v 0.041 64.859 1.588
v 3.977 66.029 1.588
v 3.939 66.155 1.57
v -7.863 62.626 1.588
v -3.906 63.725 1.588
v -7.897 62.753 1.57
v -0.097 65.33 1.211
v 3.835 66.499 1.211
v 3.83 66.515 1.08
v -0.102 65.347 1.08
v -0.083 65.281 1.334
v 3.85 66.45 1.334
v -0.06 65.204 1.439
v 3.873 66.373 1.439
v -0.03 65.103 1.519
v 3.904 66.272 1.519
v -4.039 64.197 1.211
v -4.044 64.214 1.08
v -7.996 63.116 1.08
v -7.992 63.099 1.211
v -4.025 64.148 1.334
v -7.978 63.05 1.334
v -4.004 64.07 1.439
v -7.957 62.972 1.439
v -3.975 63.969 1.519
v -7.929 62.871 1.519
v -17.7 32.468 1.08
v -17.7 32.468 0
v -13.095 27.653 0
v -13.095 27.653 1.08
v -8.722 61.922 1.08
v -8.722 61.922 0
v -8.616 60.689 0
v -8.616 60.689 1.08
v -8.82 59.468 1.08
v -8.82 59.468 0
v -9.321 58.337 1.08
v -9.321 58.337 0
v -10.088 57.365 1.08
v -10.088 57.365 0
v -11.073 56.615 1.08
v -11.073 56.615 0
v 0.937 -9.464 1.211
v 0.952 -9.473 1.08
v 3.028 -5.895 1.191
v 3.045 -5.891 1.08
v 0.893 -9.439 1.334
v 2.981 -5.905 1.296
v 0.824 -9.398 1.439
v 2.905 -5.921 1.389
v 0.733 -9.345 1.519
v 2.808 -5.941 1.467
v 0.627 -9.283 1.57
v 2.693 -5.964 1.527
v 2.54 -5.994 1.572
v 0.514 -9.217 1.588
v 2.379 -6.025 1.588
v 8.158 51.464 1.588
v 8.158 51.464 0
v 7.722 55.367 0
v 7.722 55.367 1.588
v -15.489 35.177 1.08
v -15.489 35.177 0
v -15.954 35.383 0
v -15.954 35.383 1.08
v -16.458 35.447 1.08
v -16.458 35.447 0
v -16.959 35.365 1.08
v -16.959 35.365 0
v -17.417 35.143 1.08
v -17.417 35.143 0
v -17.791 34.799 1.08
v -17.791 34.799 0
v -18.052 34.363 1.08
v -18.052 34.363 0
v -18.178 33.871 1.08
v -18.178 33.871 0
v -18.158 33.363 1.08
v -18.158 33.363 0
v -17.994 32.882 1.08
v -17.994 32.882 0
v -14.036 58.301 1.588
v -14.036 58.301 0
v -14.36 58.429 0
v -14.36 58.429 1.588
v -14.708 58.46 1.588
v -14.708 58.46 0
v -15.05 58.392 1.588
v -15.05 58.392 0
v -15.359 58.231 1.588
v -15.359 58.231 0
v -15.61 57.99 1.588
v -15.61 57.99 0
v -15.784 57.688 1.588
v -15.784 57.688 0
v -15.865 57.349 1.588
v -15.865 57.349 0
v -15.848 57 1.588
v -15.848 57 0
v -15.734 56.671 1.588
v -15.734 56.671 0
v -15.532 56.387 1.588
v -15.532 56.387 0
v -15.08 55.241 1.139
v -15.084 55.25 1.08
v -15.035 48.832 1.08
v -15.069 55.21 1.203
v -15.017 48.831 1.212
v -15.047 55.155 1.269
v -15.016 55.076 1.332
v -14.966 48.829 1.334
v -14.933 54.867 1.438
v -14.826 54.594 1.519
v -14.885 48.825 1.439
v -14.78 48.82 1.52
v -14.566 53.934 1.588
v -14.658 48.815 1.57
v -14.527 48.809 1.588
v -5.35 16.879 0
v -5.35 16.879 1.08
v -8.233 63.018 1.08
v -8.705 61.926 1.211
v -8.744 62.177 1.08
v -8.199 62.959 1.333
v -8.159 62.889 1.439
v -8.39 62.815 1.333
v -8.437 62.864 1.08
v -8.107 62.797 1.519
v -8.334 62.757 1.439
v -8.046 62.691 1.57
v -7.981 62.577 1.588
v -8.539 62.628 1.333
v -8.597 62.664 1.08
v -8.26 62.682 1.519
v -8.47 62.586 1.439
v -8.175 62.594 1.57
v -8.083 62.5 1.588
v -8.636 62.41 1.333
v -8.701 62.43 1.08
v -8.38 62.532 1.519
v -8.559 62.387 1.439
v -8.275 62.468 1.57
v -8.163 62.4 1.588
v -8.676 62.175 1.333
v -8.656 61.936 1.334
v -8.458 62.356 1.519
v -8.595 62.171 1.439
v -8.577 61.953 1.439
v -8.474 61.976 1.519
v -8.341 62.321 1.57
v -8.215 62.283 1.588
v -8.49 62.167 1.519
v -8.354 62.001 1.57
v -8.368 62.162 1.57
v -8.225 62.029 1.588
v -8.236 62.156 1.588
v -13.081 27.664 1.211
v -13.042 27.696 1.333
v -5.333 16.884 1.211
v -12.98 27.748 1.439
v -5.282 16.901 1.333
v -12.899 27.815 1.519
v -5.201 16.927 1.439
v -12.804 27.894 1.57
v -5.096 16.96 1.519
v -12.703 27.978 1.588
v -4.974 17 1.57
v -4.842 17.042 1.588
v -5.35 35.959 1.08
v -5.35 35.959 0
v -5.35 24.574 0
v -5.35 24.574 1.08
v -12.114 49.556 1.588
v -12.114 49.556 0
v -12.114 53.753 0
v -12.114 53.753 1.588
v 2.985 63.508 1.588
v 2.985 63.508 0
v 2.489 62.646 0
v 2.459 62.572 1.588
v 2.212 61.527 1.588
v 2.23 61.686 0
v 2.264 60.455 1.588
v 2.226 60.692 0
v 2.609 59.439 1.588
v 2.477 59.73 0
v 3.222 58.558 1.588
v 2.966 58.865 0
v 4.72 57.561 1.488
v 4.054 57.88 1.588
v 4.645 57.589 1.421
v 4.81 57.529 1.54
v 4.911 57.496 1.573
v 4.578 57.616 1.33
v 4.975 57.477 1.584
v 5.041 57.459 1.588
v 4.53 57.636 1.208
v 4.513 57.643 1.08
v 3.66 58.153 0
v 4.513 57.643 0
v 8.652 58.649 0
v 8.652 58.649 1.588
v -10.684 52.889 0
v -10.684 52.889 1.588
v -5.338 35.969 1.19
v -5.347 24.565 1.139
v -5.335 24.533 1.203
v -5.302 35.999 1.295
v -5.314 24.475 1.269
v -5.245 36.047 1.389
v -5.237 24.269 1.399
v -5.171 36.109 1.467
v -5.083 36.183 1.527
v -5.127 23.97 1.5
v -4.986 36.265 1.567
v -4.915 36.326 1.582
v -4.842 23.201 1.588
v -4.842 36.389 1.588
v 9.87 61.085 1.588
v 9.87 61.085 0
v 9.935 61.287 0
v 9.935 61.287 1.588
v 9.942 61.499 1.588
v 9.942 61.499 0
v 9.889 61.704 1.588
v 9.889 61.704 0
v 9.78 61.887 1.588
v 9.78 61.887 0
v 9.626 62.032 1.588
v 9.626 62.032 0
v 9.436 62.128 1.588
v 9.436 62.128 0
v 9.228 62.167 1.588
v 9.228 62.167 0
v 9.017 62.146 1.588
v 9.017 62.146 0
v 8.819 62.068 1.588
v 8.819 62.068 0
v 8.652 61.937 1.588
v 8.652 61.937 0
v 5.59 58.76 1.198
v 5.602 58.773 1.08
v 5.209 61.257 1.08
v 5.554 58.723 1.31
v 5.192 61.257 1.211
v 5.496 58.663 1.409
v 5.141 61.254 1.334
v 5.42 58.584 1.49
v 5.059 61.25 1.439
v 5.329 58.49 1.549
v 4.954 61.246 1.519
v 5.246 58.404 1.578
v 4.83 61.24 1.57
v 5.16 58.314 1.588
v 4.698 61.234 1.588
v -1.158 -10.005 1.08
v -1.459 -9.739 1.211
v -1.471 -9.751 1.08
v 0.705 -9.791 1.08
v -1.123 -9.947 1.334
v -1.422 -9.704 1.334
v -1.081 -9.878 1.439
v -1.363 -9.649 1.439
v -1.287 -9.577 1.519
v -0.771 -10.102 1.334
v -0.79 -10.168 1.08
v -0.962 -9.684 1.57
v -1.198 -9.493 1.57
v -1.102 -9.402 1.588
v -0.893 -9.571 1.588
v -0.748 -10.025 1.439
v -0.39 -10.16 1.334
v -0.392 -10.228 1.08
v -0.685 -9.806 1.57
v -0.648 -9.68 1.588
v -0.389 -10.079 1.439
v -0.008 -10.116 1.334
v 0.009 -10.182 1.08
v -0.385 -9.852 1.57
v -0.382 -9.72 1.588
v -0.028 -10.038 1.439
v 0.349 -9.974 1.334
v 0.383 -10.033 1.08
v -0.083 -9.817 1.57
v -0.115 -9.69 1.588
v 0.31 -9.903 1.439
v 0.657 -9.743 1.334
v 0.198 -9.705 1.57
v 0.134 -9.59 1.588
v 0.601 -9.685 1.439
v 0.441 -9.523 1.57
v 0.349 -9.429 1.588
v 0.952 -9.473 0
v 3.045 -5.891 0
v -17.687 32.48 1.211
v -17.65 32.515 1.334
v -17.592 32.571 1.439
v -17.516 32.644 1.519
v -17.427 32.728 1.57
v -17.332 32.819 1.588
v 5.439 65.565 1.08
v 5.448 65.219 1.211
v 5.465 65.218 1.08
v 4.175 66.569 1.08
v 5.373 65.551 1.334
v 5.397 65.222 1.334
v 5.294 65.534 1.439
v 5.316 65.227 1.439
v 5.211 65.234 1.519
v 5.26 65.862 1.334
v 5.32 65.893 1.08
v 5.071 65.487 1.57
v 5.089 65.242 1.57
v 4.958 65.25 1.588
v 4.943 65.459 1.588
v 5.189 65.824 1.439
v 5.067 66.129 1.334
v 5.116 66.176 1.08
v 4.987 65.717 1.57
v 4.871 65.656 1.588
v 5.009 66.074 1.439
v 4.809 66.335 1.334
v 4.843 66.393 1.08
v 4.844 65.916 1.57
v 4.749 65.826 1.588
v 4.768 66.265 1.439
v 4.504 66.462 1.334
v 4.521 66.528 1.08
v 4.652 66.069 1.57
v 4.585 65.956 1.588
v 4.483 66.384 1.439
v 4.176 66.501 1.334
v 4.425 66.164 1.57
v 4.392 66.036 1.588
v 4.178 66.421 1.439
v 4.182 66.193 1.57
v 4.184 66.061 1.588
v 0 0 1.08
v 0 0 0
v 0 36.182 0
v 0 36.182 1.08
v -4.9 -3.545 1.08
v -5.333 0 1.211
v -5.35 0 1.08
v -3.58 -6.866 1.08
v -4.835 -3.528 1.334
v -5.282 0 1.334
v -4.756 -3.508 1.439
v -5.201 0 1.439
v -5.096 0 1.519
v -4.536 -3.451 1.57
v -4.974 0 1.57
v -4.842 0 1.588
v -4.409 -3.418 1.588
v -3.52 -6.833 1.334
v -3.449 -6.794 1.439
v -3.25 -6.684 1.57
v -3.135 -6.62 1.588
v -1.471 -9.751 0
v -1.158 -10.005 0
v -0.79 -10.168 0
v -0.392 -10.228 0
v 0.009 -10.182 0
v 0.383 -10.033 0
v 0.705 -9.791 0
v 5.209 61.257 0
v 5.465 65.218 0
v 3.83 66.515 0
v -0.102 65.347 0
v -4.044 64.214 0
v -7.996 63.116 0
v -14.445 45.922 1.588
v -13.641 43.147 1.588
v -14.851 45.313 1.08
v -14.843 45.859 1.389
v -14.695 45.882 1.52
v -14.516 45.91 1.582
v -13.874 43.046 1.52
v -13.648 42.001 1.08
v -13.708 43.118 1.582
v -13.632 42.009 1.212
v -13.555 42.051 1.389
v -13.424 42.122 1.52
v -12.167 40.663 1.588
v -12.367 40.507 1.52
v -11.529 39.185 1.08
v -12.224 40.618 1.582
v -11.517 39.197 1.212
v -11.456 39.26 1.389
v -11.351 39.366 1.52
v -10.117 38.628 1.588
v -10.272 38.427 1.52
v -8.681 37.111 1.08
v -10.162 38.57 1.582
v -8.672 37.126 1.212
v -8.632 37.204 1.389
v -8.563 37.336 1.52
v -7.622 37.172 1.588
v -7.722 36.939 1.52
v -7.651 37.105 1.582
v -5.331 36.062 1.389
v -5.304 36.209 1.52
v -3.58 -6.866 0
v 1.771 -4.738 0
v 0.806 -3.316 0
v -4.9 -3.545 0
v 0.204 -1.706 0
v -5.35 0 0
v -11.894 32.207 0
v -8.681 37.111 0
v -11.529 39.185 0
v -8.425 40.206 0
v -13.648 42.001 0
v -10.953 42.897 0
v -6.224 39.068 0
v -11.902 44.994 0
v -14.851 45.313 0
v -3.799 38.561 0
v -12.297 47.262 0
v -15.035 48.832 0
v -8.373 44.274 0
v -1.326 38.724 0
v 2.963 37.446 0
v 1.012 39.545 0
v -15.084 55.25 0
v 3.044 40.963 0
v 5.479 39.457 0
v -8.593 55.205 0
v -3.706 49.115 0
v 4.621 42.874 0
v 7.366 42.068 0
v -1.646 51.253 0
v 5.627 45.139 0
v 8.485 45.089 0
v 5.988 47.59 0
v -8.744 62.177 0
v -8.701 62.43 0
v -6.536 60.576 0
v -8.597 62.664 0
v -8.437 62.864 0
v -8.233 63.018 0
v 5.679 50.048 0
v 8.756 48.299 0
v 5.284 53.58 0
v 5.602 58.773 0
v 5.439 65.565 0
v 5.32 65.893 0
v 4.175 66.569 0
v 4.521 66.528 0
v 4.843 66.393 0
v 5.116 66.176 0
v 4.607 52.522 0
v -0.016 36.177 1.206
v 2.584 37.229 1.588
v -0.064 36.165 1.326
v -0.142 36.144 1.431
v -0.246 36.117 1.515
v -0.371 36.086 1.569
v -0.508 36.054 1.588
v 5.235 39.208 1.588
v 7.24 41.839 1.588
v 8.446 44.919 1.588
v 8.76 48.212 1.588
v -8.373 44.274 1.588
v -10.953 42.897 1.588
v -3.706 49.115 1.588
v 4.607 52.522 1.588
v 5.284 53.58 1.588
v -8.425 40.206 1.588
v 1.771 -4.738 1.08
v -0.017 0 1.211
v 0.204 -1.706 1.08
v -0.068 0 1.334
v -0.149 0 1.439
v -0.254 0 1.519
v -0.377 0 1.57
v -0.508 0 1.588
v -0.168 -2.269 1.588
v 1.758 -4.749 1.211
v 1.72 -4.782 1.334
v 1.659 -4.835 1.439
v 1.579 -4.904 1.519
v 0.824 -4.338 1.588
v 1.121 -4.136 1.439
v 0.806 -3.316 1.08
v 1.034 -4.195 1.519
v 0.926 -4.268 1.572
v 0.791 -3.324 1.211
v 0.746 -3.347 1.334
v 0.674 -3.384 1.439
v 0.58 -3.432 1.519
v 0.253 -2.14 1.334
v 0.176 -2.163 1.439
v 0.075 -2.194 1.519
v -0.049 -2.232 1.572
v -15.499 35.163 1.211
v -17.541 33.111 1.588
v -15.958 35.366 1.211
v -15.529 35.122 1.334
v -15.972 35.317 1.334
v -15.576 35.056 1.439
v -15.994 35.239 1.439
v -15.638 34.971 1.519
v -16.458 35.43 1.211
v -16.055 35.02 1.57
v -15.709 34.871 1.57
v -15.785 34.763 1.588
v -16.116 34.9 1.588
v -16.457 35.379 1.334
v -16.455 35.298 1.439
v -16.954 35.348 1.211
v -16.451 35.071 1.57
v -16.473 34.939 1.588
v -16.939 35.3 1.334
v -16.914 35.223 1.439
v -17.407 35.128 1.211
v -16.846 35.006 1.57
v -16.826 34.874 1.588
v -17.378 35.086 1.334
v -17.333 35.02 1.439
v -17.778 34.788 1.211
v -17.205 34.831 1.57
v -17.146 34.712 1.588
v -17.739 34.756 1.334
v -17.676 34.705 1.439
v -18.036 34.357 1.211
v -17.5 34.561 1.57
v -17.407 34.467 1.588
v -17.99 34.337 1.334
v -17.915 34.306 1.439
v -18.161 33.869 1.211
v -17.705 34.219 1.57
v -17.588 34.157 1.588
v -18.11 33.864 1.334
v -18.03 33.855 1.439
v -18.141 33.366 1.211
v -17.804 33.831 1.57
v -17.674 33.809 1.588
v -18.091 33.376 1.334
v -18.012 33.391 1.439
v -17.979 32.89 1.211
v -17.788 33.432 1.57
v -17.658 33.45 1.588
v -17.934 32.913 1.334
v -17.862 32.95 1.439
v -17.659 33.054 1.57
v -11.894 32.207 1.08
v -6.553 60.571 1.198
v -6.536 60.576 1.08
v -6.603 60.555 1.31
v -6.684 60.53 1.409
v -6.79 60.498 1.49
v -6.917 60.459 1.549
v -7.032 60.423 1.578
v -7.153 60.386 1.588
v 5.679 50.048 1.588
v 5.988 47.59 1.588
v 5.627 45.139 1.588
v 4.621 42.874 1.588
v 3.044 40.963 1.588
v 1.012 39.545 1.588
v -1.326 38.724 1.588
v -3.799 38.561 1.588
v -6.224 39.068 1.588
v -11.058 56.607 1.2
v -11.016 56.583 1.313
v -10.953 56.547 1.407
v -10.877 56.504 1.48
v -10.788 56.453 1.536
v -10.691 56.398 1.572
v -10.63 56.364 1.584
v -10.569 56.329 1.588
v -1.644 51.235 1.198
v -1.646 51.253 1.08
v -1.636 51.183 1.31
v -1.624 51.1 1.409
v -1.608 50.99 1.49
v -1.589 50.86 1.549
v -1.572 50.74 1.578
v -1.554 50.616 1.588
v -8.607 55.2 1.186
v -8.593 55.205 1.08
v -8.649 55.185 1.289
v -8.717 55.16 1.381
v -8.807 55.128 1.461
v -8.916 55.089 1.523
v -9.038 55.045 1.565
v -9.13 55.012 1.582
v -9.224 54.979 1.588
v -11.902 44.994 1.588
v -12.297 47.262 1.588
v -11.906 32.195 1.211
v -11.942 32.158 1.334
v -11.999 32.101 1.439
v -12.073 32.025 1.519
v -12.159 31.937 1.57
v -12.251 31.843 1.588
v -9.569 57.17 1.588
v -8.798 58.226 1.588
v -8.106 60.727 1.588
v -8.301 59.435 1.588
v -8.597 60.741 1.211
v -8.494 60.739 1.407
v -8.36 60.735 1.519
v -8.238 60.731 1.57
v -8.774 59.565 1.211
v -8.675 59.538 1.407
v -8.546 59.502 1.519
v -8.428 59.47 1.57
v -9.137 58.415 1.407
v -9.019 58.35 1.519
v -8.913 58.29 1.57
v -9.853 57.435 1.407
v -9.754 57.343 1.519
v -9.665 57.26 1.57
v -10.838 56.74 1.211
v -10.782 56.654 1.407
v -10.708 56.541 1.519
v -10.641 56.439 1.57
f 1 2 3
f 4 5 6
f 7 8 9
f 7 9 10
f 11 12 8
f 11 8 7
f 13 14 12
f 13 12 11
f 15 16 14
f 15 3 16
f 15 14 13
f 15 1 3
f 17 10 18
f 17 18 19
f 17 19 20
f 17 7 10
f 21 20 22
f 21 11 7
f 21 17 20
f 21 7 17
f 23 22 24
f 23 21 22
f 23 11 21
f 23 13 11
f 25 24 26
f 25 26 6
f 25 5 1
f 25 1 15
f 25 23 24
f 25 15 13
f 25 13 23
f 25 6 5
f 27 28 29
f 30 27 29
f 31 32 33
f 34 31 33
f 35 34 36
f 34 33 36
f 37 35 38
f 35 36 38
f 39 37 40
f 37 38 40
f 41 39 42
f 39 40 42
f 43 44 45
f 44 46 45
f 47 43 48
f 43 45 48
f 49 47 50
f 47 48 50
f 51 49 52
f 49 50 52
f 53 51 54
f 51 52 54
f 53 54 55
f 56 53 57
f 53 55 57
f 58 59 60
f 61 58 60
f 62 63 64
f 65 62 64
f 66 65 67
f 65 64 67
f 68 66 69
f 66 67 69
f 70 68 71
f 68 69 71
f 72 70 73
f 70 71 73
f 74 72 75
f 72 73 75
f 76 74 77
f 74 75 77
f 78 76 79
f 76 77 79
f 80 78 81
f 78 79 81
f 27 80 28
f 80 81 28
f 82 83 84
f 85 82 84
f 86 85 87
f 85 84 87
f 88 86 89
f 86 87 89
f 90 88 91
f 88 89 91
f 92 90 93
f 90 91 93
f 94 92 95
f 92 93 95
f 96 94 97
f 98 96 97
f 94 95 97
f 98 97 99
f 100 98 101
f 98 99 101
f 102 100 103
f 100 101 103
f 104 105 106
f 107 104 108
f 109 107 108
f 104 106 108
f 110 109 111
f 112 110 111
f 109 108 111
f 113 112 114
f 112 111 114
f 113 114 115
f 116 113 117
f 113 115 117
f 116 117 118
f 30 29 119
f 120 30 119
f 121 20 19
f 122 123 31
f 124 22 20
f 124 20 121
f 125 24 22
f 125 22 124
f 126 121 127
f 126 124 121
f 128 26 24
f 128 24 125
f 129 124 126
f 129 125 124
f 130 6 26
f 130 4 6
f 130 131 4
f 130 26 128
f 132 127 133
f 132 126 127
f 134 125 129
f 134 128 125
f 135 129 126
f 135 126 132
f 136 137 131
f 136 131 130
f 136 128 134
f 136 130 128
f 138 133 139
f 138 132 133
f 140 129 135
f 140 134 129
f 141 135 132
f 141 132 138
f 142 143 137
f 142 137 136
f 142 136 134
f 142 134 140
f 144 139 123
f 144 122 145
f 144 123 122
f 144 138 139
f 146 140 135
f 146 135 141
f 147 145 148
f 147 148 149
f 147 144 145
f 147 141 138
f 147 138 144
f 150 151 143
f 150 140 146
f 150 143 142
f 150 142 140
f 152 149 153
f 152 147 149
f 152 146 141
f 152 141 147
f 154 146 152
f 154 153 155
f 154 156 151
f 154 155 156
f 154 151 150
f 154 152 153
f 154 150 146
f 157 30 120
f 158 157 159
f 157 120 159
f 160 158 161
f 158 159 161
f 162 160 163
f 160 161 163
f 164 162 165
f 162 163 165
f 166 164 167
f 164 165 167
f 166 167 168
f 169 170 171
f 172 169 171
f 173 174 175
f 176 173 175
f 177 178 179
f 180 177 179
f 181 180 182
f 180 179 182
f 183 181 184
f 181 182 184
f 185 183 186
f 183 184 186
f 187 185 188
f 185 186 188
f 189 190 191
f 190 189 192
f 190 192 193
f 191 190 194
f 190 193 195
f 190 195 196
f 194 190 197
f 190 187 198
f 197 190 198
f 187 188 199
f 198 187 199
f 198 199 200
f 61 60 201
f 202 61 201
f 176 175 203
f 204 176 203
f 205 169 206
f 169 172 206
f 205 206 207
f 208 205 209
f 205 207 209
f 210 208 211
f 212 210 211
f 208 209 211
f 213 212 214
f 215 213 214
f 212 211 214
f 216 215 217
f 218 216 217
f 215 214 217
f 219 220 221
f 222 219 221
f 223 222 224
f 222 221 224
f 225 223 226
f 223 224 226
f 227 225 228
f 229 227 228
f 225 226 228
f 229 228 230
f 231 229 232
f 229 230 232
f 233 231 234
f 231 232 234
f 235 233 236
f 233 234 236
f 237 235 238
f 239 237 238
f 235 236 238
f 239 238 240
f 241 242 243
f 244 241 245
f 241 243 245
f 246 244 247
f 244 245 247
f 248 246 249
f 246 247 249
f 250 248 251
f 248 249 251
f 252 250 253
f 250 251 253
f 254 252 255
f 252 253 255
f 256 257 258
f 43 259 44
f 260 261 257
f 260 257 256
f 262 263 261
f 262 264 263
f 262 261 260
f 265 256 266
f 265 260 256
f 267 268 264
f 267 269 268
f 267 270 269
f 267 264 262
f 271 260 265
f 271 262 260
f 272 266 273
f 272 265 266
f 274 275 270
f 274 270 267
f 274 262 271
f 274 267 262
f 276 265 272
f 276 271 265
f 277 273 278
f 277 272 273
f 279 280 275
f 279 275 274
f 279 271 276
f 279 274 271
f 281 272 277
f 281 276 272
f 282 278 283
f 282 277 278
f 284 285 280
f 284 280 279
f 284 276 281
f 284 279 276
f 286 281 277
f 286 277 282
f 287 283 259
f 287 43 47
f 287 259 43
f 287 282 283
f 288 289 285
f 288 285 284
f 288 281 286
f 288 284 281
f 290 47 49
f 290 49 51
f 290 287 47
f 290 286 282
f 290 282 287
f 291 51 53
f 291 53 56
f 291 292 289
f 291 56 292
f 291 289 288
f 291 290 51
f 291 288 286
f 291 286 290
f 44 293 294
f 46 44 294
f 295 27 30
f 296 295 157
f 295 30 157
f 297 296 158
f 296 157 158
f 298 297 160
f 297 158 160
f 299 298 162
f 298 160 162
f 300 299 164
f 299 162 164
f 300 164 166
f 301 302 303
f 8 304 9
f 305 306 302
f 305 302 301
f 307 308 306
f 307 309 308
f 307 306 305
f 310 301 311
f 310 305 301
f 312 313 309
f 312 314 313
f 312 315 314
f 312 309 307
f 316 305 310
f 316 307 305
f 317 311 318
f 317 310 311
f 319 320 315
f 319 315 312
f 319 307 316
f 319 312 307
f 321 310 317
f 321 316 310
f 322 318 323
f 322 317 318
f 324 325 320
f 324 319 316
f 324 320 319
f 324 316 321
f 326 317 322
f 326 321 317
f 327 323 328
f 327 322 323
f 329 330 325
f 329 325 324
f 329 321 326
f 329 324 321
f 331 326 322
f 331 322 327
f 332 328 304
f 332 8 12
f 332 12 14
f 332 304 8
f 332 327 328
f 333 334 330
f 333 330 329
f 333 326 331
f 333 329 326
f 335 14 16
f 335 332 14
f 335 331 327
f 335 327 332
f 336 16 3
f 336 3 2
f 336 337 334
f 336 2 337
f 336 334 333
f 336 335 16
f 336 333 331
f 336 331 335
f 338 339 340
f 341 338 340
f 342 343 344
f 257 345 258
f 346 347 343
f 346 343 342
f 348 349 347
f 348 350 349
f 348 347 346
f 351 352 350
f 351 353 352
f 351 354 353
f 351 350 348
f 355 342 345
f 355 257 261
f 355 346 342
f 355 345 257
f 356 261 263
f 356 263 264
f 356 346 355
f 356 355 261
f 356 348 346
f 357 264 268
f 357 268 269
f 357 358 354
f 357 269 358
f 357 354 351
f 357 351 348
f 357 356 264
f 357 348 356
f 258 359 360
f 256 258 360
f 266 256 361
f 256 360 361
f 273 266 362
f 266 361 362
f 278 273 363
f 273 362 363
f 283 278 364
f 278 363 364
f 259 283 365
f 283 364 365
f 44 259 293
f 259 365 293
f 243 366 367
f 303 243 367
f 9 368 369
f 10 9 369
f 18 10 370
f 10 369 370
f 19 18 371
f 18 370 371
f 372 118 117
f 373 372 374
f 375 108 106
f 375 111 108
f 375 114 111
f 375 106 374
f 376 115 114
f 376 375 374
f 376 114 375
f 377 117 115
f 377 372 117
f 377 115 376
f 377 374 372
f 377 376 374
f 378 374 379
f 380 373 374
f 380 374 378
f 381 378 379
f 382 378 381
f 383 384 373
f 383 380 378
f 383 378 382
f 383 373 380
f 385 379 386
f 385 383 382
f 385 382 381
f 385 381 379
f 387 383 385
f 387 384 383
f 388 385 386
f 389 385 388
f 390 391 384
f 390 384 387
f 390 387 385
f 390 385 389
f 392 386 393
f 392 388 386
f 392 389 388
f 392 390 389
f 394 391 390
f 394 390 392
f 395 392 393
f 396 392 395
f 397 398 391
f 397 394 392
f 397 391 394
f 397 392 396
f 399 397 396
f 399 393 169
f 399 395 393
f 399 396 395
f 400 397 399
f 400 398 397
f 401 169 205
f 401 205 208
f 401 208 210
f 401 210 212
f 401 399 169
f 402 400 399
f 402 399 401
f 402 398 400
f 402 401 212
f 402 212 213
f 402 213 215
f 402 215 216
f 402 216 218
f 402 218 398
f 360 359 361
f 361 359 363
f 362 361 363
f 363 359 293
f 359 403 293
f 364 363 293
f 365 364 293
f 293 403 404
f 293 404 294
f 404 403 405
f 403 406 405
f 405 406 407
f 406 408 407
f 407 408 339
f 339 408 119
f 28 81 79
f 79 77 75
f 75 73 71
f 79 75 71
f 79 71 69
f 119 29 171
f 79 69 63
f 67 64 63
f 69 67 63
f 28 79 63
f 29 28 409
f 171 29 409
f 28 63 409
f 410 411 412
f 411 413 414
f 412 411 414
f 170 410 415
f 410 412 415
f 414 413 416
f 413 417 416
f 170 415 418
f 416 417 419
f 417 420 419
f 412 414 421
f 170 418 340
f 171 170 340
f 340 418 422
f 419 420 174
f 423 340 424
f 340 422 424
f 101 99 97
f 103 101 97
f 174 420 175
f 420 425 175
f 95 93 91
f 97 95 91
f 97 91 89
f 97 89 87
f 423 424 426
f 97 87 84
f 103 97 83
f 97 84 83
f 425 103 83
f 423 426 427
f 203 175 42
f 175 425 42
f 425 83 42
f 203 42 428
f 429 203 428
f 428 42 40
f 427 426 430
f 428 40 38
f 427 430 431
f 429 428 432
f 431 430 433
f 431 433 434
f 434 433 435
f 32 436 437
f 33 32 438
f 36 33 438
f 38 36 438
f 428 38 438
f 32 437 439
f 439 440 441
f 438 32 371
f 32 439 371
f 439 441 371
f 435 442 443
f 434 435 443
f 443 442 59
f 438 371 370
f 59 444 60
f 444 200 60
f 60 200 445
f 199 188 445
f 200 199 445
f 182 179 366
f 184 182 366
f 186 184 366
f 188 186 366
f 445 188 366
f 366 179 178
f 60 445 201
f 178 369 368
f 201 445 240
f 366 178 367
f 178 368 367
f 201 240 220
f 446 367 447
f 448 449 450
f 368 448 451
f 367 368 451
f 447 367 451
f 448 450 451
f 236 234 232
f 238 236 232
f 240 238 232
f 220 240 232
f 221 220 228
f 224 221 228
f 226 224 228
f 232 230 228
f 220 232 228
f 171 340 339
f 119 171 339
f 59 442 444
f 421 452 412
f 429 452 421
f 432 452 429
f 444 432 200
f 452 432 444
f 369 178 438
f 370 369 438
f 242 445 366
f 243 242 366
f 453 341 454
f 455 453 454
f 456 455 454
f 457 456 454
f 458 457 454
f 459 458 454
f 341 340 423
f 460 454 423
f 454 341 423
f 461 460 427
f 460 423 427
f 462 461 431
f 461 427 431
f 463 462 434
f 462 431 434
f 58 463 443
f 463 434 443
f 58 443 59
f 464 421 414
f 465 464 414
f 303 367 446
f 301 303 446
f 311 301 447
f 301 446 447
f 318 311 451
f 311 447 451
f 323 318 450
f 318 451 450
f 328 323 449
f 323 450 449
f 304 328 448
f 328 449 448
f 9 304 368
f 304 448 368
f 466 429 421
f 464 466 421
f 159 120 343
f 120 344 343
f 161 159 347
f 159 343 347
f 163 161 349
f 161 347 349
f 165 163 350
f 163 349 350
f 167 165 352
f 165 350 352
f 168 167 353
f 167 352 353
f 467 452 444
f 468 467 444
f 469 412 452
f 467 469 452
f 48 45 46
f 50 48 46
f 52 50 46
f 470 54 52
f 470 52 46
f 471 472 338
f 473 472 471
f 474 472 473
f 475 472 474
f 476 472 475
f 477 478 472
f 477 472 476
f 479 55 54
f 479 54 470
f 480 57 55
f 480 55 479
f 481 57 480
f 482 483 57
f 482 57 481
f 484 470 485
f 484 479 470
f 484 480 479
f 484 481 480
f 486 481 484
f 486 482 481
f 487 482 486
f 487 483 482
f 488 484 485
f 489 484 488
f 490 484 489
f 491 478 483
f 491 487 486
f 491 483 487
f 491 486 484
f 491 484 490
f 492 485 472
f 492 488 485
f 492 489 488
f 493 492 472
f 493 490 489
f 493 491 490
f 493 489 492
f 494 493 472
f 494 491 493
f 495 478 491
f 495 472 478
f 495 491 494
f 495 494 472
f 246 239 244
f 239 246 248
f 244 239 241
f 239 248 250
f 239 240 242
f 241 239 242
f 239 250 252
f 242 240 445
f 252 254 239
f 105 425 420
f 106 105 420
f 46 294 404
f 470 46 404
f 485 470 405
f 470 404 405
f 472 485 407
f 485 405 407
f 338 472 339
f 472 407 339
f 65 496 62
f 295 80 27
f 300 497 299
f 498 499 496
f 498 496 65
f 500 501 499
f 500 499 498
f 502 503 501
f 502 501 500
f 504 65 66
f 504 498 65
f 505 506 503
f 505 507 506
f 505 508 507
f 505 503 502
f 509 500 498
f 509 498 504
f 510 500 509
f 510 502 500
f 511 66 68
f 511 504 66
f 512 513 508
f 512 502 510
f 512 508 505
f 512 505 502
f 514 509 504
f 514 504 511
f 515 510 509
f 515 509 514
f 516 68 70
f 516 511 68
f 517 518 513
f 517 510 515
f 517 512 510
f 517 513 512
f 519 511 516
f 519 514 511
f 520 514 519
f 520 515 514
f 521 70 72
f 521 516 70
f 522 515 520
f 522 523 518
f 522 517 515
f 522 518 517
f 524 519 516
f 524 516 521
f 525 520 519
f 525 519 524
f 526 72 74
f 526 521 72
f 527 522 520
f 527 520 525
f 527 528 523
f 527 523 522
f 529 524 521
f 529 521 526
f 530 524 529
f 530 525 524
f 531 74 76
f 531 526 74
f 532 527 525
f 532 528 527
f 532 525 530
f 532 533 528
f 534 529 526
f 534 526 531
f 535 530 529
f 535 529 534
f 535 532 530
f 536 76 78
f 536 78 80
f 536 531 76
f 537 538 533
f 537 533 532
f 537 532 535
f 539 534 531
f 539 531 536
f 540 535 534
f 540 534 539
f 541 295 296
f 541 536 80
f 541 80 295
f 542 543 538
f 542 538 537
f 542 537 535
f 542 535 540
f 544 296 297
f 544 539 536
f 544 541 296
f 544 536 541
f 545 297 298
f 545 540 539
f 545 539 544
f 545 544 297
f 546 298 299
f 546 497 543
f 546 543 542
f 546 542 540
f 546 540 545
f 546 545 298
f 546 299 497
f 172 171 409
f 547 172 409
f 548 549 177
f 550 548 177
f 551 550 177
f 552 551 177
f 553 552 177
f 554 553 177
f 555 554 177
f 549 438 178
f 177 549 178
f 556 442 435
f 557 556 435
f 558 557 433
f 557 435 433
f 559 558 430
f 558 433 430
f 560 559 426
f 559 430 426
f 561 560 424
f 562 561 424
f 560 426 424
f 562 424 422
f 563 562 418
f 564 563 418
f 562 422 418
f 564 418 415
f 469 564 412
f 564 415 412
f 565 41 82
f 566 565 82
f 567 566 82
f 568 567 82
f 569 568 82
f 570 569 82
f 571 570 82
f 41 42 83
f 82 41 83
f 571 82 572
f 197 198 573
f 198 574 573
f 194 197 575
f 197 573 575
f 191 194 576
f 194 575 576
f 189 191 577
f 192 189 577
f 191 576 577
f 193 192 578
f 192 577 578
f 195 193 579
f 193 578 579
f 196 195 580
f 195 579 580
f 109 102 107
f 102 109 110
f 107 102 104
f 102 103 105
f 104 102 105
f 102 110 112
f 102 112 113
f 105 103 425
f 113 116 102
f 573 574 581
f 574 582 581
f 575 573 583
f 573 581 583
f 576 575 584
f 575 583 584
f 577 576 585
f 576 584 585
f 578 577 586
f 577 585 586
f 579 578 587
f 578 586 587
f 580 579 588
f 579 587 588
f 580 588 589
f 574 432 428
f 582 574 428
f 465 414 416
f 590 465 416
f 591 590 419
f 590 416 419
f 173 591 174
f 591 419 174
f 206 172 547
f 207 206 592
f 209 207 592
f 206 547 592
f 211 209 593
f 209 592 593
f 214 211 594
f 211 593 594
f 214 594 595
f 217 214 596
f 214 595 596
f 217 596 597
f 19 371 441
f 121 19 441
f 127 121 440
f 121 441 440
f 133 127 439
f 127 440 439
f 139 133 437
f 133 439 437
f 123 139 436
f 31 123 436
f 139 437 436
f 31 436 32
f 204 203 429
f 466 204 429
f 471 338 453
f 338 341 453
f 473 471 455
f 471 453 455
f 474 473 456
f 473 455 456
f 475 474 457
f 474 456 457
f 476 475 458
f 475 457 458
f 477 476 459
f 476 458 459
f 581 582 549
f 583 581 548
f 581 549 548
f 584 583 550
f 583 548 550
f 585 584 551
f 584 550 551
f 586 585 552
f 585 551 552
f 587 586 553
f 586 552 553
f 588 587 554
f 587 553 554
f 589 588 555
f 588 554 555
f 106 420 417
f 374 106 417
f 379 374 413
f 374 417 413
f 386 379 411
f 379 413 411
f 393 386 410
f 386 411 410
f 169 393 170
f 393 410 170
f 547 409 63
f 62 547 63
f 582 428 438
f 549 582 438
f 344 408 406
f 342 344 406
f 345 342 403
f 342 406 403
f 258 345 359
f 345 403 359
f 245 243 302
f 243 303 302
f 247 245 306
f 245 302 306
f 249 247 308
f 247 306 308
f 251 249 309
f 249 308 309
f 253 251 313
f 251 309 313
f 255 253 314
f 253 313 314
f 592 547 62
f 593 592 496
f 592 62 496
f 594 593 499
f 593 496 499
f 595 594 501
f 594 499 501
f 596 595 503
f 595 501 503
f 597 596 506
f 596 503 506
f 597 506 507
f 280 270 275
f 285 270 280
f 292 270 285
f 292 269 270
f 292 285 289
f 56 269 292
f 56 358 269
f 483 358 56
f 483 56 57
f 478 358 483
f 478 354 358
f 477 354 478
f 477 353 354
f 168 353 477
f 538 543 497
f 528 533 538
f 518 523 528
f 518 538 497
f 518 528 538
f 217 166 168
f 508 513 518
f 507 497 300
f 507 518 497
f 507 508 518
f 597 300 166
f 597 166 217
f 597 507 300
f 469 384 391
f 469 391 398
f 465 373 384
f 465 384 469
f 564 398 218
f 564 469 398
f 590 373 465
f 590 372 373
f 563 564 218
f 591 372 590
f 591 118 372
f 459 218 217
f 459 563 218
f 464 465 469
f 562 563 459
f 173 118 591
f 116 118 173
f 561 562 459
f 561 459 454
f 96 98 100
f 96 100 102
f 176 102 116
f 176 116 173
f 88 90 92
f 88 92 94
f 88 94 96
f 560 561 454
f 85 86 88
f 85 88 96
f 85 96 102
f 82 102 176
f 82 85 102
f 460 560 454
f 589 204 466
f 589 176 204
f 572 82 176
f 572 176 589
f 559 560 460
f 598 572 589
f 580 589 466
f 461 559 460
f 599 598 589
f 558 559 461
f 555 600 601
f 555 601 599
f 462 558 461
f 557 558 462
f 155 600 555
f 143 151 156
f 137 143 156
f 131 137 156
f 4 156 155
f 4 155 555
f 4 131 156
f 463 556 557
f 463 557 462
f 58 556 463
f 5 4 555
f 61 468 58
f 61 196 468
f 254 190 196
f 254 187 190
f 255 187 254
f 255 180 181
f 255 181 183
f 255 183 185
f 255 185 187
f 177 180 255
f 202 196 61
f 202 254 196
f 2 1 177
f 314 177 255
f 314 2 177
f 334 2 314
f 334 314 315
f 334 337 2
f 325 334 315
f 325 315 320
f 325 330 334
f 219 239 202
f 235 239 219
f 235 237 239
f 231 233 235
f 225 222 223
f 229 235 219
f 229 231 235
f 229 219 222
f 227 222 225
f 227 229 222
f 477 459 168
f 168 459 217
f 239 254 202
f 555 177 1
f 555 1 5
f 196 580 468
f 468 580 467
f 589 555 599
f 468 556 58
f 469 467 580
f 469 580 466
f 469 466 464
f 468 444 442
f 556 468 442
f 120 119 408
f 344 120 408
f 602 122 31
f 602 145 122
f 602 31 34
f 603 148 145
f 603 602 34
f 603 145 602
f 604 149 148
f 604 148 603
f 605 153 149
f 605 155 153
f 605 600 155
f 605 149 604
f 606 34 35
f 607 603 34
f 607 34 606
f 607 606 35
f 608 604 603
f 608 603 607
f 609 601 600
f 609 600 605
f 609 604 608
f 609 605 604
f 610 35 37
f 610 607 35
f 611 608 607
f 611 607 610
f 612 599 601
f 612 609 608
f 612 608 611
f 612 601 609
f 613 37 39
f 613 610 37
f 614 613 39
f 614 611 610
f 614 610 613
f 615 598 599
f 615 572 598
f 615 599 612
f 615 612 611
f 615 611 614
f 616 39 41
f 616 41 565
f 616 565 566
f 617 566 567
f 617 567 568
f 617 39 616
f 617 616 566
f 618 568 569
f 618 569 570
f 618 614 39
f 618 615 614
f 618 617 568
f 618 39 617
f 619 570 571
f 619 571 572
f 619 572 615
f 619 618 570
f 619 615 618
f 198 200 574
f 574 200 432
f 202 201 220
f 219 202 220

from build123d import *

# Parameters (mm, degrees)
F1_DEPTH = 1.5875
F2_R     = 0.508


with BuildPart() as f1:
    # F0 (on Top) → F1 (new body)
    with BuildSketch(Plane.XY):
        with BuildLine():
            Line((0, 0), (0, 36.181841))
            ThreePointArc((0, 36.181841), (7.365943, 42.068416), (8.157768, 51.46426))
            Line((8.157768, 51.46426), (7.721588, 55.367384))
            Line((7.721588, 55.367384), (8.652184, 58.648949))
            Line((8.652184, 58.648949), (9.870096, 61.084771))
            ThreePointArc((9.870096, 61.084771), (9.625521, 62.031582), (8.652184, 61.937326))
            Line((8.652184, 61.937326), (5.601979, 58.772682))
            Line((5.601979, 58.772682), (5.208922, 61.257325))
            Line((5.208922, 61.257325), (5.464944, 65.217614))
            ThreePointArc((5.464944, 65.217614), (4.987229, 66.294216), (3.830332, 66.515285))
            ThreePointArc((3.830332, 66.515285), (-2.071538, 64.775722), (-7.996314, 63.115845))
            ThreePointArc((-7.996314, 63.115845), (-8.59693, 62.663559), (-8.722139, 61.922193))
            ThreePointArc((-8.722139, 61.922193), (-9.034725, 58.886588), (-11.072643, 56.615136))
            Line((-11.072643, 56.615136), (-14.036038, 58.300966))
            ThreePointArc((-14.036038, 58.300966), (-15.610352, 57.989945), (-15.532072, 56.387113))
            Line((-15.532072, 56.387113), (-15.084018, 55.249624))
            Line((-15.084018, 55.249624), (-15.034714, 48.831713))
            ThreePointArc((-15.034714, 48.831713), (-12.693009, 40.514111), (-5.350228, 35.95893))
            Line((-5.350228, 35.95893), (-5.350228, 24.574336))
            Line((-5.350228, 24.574336), (-11.894111, 32.207083))
            Line((-11.894111, 32.207083), (-15.489053, 35.177361))
            ThreePointArc((-15.489053, 35.177361), (-17.791277, 34.799442), (-17.699574, 32.468208))
            Line((-17.699574, 32.468208), (-13.094822, 27.652631))
            Line((-13.094822, 27.652631), (-5.350228, 16.878592))
            Line((-5.350228, 16.878592), (-5.350228, 0))
            ThreePointArc((-5.350228, 0), (-4.344885, -5.247215), (-1.471247, -9.751234))
            ThreePointArc((-1.471247, -9.751234), (-0.189936, -10.218473), (0.952239, -9.473151))
            Line((0.952239, -9.473151), (3.04463, -5.891468))
            ThreePointArc((3.04463, -5.891468), (0.806147, -3.31584), (0, 0))
        make_face()
        with BuildLine():
            Line((-3.706487, 49.114973), (-8.372727, 44.273662))
            Line((-8.372727, 44.273662), (-10.95271, 42.896778))
            ThreePointArc((-10.95271, 42.896778), (-12.170993, 46.115262), (-12.113919, 49.556133))
            Line((-12.113919, 49.556133), (-12.113919, 53.752957))
            Line((-12.113919, 53.752957), (-10.684032, 52.888518))
            Line((-10.684032, 52.888518), (-3.706487, 49.114973))
        make_face(mode=Mode.SUBTRACT)
        with BuildLine():
            ThreePointArc((5.67868, 50.048354), (2.07604, 40.184885), (-8.42475, 40.206277))
            Line((-8.42475, 40.206277), (4.606551, 52.521817))
            Line((4.606551, 52.521817), (5.284048, 53.579681))
            Line((5.284048, 53.579681), (5.67868, 50.048354))
        make_face(mode=Mode.SUBTRACT)
        with BuildLine():
            Line((4.513334, 57.643192), (-1.646189, 51.252572))
            Line((-1.646189, 51.252572), (-8.593214, 55.204628))
            Line((-8.593214, 55.204628), (-6.536069, 60.575932))
            Line((-6.536069, 60.575932), (2.98464, 63.507594))
            ThreePointArc((2.98464, 63.507594), (2.320412, 60.203001), (4.513334, 57.643192))
        make_face(mode=Mode.SUBTRACT)
    extrude(amount=F1_DEPTH)

    # F2
    f2_edges = [f1.edges().sort_by_distance(p)[0] for p in [
        (-7.564642, 57.89028, 1.5875),
        (-5.119701, 53.2286, 1.5875),
        (1.433573, 54.447882, 1.5875),
        (-9.034725, 58.886588, 1.5875),
        (5.405451, 60.015003, 1.5875),
        (-15.059366, 52.040668, 1.5875),
        (-12.693009, 40.514111, 1.5875),
        (-5.350228, 30.266633, 1.5875),
        (-8.622169, 28.390709, 1.5875),
        (-13.691582, 33.692222, 1.5875),
        (-17.791277, 34.799442, 1.5875),
        (-15.397198, 30.060419, 1.5875),
        (-9.222525, 22.265611, 1.5875),
        (-5.350228, 8.439296, 1.5875),
        (0.806147, -3.31584, 1.5875),
    ]]
    fillet(f2_edges, radius=F2_R)


solid = f1.part
